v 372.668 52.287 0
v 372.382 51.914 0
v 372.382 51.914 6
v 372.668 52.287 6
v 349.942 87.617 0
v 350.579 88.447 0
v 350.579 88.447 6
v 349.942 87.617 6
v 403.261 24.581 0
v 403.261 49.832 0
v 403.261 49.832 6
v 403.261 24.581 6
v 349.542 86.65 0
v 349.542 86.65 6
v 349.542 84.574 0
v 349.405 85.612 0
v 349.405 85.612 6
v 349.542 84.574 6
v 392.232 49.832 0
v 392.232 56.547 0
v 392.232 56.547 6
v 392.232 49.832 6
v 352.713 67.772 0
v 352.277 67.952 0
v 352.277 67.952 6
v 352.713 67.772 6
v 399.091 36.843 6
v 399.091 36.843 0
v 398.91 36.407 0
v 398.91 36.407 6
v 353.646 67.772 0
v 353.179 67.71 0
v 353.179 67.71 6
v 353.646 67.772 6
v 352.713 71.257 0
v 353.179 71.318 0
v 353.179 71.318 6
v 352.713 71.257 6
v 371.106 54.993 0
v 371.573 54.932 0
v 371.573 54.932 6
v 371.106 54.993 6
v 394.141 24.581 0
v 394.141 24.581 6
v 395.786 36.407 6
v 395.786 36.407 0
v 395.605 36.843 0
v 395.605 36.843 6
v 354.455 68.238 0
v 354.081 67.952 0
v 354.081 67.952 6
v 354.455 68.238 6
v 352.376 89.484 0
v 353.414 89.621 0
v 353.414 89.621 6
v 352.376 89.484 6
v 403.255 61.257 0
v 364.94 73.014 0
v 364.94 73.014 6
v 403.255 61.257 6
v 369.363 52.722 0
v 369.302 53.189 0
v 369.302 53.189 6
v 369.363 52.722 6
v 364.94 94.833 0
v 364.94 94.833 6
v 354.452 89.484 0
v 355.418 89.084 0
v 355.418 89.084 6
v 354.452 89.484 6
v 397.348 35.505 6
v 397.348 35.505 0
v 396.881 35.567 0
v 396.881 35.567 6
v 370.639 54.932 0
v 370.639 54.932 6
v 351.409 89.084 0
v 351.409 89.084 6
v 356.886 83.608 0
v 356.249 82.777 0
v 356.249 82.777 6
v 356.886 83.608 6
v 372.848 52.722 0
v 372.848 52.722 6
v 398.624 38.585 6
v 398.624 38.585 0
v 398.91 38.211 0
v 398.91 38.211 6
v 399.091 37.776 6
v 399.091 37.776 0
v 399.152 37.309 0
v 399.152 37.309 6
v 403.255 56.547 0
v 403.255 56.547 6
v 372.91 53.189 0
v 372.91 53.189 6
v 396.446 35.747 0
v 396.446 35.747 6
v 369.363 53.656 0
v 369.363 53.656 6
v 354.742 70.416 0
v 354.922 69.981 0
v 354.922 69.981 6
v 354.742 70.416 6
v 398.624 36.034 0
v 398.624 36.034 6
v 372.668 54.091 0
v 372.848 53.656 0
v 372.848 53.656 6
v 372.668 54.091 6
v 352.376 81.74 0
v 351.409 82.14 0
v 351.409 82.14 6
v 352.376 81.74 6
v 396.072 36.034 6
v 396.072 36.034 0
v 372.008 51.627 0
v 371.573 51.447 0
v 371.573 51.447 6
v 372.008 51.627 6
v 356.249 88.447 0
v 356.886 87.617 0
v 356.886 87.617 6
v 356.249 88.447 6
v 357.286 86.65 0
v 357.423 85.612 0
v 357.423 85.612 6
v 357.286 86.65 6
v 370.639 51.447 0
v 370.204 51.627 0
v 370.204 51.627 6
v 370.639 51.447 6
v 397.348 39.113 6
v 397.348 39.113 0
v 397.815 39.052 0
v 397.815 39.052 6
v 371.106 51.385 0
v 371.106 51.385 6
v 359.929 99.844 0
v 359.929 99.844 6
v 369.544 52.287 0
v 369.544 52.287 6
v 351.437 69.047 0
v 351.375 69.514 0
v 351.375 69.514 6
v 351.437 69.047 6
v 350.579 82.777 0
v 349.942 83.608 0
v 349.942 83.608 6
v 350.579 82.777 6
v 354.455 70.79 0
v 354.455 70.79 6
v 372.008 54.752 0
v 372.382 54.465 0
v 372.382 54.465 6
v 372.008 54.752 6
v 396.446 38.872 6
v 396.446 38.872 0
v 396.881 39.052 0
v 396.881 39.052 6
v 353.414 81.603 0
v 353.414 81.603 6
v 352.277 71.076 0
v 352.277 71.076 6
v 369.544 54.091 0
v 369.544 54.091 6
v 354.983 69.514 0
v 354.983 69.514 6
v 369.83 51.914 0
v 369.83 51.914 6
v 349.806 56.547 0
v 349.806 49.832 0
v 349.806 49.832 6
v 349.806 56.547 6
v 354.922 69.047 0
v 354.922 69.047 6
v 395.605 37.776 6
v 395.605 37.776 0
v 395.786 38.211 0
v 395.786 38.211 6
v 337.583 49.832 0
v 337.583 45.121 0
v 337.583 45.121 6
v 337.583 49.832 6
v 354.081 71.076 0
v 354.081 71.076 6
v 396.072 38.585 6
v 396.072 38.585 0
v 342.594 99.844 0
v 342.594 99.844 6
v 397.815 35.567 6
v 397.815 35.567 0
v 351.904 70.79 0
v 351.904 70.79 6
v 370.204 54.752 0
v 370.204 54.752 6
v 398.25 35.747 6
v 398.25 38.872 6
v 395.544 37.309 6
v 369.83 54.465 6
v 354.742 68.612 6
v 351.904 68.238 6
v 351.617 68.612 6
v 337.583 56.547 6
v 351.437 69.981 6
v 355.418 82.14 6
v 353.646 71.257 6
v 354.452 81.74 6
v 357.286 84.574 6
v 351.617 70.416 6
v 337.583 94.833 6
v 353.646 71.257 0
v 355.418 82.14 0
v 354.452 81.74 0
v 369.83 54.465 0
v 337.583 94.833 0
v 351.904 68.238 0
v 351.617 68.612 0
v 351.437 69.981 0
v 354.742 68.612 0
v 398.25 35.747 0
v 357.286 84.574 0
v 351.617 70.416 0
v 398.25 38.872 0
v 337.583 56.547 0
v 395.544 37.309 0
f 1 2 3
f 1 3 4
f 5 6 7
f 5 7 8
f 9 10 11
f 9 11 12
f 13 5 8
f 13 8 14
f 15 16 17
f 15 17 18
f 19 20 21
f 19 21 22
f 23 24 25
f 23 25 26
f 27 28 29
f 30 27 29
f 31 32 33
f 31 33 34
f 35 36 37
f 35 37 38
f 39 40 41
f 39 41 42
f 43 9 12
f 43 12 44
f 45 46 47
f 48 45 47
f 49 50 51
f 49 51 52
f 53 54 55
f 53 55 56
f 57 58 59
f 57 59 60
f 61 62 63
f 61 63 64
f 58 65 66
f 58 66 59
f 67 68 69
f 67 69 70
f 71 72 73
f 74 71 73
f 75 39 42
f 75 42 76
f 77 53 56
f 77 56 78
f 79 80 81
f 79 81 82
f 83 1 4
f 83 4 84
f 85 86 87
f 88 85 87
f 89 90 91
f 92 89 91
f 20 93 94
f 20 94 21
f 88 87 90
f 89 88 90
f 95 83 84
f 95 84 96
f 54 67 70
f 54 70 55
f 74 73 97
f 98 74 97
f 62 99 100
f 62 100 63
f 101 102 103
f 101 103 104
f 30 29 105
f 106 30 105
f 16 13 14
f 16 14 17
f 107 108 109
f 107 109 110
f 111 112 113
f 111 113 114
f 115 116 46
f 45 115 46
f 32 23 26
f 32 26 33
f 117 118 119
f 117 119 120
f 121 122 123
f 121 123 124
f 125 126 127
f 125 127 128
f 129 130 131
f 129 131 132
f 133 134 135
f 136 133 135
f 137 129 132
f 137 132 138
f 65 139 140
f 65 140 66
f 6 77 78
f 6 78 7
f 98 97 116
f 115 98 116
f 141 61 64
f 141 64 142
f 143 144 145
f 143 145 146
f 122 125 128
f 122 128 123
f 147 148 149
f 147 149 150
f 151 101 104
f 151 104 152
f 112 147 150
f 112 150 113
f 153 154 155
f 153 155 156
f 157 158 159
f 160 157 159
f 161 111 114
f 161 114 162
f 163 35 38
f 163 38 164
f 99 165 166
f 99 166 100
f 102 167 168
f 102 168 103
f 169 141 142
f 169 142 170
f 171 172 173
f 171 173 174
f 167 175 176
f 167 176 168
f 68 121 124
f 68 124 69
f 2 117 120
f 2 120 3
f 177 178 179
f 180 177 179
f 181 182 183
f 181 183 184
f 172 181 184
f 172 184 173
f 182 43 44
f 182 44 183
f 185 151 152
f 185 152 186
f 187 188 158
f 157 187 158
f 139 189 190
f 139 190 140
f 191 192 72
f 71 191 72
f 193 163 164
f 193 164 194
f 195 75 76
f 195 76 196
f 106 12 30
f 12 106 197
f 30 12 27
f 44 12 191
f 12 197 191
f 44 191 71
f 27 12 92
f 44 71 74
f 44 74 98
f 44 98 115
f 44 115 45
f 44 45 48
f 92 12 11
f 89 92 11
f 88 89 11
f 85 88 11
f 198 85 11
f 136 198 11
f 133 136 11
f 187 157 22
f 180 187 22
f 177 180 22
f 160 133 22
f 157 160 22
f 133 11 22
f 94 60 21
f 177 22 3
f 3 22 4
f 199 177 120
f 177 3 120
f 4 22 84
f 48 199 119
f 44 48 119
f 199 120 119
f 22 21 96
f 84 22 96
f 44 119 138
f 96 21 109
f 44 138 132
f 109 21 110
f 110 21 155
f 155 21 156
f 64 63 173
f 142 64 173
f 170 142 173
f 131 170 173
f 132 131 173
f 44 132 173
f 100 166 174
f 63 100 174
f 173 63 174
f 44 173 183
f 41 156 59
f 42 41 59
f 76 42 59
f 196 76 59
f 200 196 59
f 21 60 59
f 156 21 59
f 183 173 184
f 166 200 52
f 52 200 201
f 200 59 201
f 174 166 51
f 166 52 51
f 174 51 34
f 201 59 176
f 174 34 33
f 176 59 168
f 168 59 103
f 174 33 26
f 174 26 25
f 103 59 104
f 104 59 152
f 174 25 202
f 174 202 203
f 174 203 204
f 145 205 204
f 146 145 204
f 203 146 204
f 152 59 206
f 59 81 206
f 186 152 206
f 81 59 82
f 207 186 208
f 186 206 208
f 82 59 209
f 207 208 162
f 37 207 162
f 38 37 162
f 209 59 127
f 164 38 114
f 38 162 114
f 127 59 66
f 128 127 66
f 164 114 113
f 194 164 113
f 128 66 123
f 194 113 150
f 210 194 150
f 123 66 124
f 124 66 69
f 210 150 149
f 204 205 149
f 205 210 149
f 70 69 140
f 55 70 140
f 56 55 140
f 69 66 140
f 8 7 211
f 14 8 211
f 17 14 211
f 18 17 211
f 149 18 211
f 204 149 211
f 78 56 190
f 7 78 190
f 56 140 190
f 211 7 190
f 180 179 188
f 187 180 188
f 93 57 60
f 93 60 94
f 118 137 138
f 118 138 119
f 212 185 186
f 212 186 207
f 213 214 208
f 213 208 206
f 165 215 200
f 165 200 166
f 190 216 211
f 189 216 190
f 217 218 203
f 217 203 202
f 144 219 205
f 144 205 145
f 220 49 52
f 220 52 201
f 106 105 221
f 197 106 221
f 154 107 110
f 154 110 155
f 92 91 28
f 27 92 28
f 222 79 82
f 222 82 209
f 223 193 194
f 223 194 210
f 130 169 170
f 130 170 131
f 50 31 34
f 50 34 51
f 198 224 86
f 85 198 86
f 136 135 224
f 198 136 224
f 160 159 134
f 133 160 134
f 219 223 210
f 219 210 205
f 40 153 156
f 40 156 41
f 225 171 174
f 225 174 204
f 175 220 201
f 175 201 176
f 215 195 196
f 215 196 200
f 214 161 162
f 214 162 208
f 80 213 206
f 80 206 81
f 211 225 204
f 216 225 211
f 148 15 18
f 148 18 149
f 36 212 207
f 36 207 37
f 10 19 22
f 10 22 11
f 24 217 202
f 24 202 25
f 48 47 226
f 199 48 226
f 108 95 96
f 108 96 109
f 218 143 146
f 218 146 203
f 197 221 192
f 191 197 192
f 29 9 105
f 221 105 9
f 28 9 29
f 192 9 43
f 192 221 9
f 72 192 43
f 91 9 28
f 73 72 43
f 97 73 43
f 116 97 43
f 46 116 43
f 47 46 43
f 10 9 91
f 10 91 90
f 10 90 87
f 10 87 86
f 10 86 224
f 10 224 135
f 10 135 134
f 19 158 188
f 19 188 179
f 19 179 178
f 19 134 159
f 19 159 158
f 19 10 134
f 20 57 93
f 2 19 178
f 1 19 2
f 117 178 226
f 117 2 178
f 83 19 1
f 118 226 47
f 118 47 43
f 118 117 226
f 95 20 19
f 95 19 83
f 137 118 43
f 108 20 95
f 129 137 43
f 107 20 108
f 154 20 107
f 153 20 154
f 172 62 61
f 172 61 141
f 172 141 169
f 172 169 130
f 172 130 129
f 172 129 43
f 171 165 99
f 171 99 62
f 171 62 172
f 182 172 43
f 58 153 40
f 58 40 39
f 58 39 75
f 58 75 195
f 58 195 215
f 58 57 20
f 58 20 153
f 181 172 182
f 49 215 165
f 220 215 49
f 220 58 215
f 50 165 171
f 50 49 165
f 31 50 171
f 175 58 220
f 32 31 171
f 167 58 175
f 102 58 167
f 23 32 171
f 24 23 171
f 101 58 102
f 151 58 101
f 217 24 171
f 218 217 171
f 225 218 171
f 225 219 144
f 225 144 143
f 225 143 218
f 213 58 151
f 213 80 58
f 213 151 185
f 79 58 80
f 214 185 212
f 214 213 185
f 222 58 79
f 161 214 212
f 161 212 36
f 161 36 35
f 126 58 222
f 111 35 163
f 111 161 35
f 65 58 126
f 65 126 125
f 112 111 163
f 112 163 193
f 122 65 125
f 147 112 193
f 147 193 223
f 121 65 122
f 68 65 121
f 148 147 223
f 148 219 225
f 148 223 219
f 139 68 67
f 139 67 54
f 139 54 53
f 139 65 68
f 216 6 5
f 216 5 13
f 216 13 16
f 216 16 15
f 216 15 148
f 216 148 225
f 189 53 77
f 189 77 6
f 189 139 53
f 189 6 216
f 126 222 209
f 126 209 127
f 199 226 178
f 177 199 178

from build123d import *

# Parameters (mm, degrees)
BOSS_EXTRUDE1_DEPTH = 6


with BuildPart() as part:
    # Sketch1 → Boss-Extrude1 (new body)
    with BuildSketch(Plane.XY):
        Polygon((349.805861239, 49.832080259), (349.805861239, 56.546676312), (337.582956824, 56.546676312), (337.582956824, 94.832680829), (342.594184557, 99.843908562), (359.928534592, 99.843908562), (364.939762315, 94.832680839), (364.939762315, 73.014449736), (403.254521851, 61.257454897), (403.254521851, 56.546676274), (392.232066466, 56.546676274), (392.232066466, 49.832080221), (403.26125874, 49.832080221), (403.26125874, 24.580912459), (394.140824266, 24.580912459), (337.582956824, 45.121301639), (337.582956824, 49.832080259), align=None)
        Polygon((396.07235895, 38.585081223), (396.445988279, 38.87177709), (396.881088847, 39.052001647), (397.348009271, 39.113472887), (397.814929694, 39.052001647), (398.250030262, 38.87177709), (398.623659591, 38.585081223), (398.910355458, 38.211451895), (399.090580014, 37.776351326), (399.152051254, 37.309430903), (399.090580014, 36.842510479), (398.910355458, 36.407409911), (398.623659591, 36.033780583), (398.250030262, 35.747084715), (397.814929694, 35.566860159), (397.348009271, 35.505388919), (396.881088847, 35.566860159), (396.445988279, 35.747084715), (396.07235895, 36.033780583), (395.785663083, 36.407409911), (395.605438527, 36.842510479), (395.543967287, 37.309430903), (395.605438527, 37.776351326), (395.785663083, 38.211451895), align=None, mode=Mode.SUBTRACT)
        Polygon((351.375405933, 69.514088989), (351.436877173, 69.047168565), (351.617101729, 68.612067997), (351.903797596, 68.238438669), (352.277426924, 67.951742801), (352.712527493, 67.771518245), (353.179447916, 67.710047005), (353.64636834, 67.771518245), (354.081468908, 67.951742801), (354.455098237, 68.238438669), (354.741794104, 68.612067997), (354.92201866, 69.047168565), (354.9834899, 69.514088989), (354.92201866, 69.981009412), (354.741794104, 70.416109981), (354.455098237, 70.789739309), (354.081468908, 71.076435176), (353.64636834, 71.256659733), (353.179447916, 71.318130973), (352.712527493, 71.256659733), (352.277426924, 71.076435176), (351.903797596, 70.789739309), (351.617101729, 70.416109981), (351.436877173, 69.981009412), align=None, mode=Mode.SUBTRACT)
        Polygon((372.381509854, 54.465028594), (372.007880526, 54.751724461), (371.572779958, 54.931949018), (371.105859534, 54.993420258), (370.638939111, 54.931949018), (370.203838542, 54.751724461), (369.830209214, 54.465028594), (369.543513347, 54.091399266), (369.36328879, 53.656298697), (369.30181755, 53.189378274), (369.36328879, 52.72245785), (369.543513347, 52.287357282), (369.830209214, 51.913727954), (370.203838542, 51.627032087), (370.638939111, 51.44680753), (371.105859534, 51.38533629), (371.572779958, 51.44680753), (372.007880526, 51.627032087), (372.381509854, 51.913727954), (372.668205722, 52.287357282), (372.848430278, 52.72245785), (372.909901518, 53.189378274), (372.848430278, 53.656298697), (372.668205722, 54.091399266), align=None, mode=Mode.SUBTRACT)
        Polygon((350.579160049, 82.777243303), (351.409447446, 82.140141376), (352.376337597, 81.739642362), (353.413938539, 81.603039606), (354.45153948, 81.739642362), (355.418429632, 82.140141376), (356.248717028, 82.777243303), (356.885818955, 83.607530699), (357.286317969, 84.574420851), (357.422920725, 85.612021792), (357.286317969, 86.649622733), (356.885818955, 87.616512885), (356.248717028, 88.446800282), (355.418429632, 89.083902209), (354.45153948, 89.484401223), (353.413938539, 89.621003978), (352.376337597, 89.484401223), (351.409447446, 89.083902209), (350.579160049, 88.446800282), (349.942058122, 87.616512885), (349.541559108, 86.649622733), (349.404956353, 85.612021792), (349.541559108, 84.574420851), (349.942058122, 83.607530699), align=None, mode=Mode.SUBTRACT)
    extrude(amount=BOSS_EXTRUDE1_DEPTH)


solid = part.part
